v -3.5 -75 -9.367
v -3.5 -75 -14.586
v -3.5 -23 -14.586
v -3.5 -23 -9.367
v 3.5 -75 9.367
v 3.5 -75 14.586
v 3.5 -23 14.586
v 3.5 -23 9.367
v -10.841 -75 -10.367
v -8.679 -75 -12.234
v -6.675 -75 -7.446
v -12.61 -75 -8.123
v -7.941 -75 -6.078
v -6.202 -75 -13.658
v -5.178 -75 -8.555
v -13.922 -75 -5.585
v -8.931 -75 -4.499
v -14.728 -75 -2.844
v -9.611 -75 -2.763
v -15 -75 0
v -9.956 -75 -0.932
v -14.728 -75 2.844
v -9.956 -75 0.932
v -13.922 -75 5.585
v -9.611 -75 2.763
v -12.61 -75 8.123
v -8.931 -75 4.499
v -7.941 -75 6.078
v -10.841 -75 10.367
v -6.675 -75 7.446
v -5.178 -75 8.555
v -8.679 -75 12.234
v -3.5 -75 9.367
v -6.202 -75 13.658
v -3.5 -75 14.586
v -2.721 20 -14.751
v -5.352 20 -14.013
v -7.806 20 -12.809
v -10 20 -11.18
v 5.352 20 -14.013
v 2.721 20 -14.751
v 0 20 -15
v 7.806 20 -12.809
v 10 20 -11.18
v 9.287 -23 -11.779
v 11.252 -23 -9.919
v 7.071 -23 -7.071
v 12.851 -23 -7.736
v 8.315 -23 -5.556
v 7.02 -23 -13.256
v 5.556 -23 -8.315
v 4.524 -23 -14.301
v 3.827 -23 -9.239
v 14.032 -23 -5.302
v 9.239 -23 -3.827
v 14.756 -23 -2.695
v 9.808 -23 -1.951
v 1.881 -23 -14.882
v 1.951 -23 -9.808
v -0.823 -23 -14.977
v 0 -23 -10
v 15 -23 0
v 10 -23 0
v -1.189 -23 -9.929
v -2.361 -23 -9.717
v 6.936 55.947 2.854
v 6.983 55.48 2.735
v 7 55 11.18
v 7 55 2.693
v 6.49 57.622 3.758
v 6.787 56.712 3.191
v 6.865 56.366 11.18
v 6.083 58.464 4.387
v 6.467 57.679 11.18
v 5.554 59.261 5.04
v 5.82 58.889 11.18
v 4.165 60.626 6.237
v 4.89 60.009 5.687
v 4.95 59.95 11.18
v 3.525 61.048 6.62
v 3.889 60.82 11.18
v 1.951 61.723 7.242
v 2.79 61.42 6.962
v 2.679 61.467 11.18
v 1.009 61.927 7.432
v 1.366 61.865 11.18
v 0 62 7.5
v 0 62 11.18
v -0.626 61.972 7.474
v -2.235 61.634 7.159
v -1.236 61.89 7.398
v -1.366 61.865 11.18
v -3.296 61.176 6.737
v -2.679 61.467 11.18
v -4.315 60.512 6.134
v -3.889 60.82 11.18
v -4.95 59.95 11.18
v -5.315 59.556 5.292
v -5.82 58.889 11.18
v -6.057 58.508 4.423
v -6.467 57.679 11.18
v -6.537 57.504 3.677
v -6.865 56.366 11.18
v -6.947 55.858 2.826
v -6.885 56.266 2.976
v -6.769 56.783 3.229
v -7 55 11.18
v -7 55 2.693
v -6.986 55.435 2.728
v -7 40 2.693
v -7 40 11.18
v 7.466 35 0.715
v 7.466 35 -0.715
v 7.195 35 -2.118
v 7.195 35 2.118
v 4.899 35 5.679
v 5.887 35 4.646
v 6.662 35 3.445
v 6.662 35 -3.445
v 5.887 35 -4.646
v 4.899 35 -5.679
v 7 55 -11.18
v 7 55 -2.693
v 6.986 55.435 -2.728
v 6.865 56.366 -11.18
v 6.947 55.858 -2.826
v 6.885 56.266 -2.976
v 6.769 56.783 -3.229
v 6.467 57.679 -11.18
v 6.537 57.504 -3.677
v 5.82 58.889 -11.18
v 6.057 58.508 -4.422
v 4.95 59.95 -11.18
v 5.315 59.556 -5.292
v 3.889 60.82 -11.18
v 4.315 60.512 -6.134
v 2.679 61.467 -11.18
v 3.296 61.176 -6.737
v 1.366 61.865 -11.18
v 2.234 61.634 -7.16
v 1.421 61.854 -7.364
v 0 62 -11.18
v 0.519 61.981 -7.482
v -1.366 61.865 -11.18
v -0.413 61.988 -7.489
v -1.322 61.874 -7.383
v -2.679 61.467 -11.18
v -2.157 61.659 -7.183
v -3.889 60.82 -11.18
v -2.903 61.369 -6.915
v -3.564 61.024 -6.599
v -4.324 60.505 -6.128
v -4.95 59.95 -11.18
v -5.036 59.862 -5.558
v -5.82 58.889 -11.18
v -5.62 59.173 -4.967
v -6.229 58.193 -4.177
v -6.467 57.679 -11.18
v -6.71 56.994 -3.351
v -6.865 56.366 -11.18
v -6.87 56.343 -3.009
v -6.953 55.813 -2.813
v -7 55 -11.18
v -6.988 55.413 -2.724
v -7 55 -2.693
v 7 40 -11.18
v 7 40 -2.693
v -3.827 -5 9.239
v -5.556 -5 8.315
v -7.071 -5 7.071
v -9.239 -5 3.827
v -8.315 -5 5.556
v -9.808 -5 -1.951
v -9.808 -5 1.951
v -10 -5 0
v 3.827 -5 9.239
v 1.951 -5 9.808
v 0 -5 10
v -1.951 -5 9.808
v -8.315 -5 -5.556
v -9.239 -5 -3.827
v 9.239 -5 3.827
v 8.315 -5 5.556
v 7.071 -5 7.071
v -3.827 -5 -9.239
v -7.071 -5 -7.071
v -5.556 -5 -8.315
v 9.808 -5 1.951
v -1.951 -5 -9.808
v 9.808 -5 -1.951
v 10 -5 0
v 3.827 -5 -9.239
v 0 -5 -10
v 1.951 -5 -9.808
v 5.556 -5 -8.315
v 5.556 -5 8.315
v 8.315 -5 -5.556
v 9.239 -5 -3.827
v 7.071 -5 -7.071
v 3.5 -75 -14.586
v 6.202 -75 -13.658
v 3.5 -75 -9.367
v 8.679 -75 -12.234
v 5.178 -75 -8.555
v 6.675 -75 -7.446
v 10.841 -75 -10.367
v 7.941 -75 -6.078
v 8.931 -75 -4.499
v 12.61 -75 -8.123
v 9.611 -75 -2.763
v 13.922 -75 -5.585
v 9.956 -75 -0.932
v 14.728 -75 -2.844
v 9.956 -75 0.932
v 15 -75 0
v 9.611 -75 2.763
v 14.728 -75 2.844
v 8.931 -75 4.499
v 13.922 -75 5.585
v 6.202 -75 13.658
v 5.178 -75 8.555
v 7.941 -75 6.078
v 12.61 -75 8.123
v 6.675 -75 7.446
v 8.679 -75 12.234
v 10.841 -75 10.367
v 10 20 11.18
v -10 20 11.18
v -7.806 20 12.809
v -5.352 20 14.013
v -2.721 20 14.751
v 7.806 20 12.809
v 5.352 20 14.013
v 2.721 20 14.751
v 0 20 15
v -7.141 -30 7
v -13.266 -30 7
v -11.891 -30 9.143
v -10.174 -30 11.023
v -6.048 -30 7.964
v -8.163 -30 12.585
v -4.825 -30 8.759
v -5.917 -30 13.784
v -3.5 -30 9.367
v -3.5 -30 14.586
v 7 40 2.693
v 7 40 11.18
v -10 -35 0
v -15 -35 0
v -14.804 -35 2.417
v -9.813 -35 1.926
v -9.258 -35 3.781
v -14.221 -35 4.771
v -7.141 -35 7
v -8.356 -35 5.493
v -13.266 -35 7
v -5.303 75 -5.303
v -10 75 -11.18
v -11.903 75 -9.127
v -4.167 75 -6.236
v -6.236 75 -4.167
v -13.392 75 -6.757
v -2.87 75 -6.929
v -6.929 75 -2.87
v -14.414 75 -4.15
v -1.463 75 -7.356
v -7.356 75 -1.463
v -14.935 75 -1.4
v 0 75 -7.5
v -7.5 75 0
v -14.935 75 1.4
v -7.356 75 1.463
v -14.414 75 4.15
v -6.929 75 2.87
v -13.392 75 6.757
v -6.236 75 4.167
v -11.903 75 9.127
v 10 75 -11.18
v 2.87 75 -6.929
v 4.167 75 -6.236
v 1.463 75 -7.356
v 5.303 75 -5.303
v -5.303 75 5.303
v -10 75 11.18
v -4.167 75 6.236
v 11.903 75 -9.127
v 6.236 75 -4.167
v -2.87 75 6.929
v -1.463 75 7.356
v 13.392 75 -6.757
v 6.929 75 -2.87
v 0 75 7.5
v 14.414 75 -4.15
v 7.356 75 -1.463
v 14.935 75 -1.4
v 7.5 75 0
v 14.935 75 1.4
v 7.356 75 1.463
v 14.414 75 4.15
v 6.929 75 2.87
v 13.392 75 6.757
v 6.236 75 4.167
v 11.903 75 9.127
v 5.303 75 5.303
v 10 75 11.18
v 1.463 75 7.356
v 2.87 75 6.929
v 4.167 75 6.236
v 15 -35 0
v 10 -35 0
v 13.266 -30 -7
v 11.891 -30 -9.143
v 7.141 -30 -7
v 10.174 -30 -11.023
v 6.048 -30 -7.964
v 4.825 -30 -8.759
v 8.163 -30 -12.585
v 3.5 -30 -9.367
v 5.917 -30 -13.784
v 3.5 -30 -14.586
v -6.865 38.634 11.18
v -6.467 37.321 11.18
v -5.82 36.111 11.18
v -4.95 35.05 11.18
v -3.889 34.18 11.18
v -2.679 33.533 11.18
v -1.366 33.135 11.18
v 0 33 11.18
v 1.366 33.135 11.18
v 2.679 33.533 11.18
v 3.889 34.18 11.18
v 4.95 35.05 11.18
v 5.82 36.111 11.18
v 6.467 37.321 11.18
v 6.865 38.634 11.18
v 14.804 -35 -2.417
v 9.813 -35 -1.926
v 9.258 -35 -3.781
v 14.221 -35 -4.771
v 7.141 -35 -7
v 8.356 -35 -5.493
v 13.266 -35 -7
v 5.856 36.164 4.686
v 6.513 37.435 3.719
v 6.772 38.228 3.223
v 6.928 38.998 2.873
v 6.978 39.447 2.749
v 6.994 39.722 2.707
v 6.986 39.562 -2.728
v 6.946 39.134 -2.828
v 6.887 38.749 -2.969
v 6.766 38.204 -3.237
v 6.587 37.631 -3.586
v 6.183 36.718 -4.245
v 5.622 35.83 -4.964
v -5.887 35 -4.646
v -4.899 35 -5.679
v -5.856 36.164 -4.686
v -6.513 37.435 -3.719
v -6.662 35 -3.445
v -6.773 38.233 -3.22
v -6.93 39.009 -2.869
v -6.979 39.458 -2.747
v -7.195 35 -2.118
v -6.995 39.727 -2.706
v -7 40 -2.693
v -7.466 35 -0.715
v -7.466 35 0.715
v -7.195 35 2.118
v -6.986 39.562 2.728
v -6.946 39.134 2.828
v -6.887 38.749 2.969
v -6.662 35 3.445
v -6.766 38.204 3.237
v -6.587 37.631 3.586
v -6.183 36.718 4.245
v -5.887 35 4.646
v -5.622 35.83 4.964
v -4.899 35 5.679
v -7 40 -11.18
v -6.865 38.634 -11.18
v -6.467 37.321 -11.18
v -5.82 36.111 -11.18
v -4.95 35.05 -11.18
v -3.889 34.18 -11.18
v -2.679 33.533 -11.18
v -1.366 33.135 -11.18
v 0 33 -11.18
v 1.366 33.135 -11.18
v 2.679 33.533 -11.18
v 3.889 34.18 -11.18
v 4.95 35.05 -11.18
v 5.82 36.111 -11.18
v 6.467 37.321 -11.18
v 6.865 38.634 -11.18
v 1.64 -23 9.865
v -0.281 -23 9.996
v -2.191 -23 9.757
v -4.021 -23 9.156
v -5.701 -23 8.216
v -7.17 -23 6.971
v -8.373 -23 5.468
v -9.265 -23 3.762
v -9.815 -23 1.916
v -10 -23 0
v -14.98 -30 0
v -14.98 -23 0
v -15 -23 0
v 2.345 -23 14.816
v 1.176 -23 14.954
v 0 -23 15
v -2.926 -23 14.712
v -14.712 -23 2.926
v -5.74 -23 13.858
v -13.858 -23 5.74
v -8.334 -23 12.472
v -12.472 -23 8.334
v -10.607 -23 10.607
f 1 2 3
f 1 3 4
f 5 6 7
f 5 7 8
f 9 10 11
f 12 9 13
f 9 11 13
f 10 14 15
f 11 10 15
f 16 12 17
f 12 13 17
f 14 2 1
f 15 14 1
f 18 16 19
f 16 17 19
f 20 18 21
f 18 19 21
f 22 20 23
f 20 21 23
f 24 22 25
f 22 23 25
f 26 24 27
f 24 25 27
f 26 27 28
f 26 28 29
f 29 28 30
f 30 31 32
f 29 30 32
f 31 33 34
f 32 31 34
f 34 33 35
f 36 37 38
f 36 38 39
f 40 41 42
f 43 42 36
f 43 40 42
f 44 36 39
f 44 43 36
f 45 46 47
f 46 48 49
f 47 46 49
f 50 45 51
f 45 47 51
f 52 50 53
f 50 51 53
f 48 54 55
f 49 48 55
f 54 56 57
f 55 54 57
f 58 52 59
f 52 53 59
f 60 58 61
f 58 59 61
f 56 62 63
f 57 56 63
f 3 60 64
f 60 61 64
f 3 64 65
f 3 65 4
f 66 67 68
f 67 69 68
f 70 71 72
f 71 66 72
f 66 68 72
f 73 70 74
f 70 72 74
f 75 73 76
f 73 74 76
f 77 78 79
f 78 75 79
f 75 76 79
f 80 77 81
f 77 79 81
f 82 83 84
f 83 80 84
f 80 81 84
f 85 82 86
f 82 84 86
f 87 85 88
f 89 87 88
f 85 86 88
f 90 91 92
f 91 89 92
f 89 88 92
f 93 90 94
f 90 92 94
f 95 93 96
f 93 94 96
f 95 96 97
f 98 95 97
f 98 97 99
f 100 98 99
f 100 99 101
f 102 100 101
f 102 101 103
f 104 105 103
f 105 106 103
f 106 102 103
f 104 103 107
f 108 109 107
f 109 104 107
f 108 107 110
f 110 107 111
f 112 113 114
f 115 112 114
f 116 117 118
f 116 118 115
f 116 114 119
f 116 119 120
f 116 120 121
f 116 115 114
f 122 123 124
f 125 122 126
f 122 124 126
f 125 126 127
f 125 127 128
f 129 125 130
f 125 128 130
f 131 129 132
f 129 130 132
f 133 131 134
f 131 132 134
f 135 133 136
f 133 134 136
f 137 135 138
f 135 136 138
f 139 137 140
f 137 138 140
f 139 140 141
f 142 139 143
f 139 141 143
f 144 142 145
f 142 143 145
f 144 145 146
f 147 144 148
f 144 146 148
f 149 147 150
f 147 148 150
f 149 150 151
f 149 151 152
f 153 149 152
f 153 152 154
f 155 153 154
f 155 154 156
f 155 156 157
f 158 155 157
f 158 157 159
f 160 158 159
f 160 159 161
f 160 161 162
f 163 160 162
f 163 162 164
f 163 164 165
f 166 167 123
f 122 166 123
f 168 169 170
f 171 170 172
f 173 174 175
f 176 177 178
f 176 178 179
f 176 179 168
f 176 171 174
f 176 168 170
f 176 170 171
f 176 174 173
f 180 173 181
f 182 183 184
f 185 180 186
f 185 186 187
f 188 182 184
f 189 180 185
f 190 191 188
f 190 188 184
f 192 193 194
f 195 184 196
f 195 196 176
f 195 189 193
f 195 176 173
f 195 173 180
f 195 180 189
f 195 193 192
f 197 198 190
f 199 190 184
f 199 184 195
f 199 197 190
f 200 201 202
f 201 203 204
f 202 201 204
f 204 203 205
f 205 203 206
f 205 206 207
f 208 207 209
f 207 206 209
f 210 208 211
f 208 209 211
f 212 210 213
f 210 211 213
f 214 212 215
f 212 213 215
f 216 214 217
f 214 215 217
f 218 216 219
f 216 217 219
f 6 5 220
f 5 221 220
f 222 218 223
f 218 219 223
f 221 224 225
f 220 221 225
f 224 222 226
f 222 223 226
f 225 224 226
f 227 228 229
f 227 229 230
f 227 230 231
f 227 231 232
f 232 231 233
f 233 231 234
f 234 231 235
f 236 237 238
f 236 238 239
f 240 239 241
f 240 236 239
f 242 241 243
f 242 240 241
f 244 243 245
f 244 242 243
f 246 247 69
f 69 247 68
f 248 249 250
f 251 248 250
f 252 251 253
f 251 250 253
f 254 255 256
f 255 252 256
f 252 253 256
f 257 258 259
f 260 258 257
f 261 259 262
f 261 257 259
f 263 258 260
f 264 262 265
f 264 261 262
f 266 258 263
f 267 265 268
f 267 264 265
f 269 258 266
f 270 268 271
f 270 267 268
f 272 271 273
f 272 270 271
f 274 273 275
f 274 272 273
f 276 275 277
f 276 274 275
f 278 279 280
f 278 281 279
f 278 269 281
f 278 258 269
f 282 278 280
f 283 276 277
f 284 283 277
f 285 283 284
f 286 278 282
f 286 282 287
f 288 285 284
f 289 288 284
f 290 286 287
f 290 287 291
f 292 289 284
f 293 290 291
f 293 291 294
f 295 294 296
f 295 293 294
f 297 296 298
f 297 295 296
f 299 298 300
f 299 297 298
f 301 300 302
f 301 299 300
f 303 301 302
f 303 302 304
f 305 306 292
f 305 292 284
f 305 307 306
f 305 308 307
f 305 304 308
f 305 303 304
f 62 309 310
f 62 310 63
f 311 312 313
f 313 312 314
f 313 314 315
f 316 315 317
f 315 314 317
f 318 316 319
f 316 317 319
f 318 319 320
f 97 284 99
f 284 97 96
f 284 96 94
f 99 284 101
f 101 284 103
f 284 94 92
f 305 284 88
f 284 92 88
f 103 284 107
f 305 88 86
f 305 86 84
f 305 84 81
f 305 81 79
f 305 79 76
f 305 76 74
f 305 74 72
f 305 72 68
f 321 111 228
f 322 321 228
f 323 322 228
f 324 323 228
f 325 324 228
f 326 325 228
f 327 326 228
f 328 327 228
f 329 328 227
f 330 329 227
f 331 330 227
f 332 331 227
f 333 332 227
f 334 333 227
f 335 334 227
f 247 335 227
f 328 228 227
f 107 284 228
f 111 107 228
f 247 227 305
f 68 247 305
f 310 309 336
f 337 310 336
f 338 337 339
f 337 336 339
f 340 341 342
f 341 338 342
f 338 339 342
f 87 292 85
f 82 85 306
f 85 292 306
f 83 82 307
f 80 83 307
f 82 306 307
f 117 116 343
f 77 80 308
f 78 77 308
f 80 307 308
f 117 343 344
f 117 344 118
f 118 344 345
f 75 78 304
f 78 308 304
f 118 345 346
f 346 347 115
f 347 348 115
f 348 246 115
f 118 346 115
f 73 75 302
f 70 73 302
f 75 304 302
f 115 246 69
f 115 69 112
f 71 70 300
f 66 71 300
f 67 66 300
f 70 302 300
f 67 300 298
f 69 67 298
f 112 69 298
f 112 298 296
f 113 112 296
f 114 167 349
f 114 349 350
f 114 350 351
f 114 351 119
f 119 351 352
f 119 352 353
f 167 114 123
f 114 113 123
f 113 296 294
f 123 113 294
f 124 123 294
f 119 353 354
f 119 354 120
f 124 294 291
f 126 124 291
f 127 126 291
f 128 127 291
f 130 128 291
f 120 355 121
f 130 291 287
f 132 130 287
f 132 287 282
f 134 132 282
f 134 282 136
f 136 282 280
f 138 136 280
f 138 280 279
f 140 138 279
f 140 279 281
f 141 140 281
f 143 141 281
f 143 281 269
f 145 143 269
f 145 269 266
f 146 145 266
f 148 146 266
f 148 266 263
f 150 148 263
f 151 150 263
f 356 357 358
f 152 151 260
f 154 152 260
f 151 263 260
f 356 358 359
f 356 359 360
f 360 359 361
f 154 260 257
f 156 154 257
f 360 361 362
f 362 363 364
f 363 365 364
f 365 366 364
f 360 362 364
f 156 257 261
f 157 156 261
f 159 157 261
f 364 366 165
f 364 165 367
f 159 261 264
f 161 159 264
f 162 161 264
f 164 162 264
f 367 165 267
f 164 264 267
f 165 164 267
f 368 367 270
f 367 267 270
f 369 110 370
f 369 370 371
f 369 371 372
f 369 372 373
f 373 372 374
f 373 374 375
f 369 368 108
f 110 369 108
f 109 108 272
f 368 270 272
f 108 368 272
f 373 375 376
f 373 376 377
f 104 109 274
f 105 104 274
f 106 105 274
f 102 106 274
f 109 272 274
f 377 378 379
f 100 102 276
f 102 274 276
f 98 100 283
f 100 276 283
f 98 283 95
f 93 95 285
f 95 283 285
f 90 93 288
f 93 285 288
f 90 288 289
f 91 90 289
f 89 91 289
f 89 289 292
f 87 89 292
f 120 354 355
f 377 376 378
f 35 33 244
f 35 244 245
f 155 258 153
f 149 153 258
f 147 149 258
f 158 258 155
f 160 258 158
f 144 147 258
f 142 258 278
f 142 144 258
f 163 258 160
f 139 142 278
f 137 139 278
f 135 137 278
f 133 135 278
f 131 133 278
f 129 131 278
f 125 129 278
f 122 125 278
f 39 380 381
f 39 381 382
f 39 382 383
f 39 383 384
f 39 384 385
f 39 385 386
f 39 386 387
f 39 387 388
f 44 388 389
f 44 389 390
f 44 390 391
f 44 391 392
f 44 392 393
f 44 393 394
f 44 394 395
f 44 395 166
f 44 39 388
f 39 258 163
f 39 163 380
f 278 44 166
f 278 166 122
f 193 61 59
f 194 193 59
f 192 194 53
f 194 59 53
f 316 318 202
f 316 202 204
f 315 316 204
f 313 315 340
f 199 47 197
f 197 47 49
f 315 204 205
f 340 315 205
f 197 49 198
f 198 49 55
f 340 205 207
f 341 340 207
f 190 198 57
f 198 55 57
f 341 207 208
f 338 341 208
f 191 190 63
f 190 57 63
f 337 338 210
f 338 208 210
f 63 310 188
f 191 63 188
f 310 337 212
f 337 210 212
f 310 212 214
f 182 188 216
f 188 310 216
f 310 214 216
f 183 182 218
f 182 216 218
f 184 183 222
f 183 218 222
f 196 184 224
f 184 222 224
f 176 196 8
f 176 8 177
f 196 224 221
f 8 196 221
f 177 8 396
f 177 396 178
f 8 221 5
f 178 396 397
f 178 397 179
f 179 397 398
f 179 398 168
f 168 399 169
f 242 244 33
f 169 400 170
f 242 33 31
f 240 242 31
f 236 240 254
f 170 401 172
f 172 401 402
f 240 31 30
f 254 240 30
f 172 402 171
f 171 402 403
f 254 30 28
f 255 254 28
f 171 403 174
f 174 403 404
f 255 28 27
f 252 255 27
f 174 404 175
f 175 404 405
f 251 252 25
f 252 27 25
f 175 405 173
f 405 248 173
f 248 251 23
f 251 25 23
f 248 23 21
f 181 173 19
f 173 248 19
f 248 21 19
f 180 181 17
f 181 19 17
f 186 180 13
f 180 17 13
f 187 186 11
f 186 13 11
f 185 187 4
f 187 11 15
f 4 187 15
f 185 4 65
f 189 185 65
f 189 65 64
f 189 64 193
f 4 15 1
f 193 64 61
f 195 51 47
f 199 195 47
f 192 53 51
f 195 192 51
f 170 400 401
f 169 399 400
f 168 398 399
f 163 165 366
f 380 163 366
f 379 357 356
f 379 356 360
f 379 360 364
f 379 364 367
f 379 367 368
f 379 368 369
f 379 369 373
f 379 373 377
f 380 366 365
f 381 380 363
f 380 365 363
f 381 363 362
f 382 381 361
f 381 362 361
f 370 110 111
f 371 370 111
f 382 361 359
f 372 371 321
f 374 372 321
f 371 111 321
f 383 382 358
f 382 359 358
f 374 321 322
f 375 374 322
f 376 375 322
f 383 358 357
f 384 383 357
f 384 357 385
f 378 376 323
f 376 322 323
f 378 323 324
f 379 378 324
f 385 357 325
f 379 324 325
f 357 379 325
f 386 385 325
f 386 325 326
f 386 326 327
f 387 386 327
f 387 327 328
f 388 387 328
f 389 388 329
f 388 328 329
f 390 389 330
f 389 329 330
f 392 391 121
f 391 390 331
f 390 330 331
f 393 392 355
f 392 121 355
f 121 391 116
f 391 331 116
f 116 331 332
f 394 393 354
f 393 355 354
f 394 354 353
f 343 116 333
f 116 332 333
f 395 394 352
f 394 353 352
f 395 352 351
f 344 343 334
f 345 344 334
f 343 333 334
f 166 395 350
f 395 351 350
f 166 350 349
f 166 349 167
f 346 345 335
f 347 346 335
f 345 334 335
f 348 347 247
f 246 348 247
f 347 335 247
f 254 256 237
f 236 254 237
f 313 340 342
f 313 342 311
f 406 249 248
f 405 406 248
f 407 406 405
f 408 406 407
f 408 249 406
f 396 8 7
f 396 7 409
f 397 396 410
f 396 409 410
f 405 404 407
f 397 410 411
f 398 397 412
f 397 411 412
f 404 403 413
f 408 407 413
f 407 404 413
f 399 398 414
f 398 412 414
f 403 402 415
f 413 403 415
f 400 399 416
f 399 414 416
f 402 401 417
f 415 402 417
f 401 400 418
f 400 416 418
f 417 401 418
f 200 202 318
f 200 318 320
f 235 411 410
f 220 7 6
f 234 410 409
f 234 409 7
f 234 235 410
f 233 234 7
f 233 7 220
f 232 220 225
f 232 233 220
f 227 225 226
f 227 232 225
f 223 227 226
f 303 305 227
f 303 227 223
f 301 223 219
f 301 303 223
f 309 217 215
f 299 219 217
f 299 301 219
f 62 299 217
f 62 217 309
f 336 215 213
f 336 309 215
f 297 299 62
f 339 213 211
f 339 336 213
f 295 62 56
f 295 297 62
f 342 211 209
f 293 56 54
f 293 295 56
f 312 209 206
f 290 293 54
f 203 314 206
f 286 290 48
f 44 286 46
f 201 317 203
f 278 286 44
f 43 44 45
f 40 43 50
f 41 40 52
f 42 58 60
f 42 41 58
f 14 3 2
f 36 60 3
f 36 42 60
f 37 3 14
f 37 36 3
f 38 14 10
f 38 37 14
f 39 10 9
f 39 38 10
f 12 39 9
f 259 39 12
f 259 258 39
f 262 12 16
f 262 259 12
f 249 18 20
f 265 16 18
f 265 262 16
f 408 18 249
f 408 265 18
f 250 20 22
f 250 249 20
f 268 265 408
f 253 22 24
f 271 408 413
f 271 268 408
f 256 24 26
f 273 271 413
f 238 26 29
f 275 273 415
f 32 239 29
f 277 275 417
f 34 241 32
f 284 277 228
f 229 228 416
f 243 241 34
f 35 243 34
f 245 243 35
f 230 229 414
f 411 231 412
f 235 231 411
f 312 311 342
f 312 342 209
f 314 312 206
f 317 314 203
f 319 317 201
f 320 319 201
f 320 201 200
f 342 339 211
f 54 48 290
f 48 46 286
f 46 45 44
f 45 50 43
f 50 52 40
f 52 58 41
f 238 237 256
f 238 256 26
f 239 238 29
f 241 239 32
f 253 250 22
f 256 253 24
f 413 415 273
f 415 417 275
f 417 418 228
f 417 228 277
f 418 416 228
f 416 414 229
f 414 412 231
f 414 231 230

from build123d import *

# Parameters (mm, degrees)
SKETCH1_R                = 15
BOSS_EXTRUDE1_DEPTH      = 75
CUT_EXTRUDE1_DEPTH       = 52
CUT_EXTRUDE2_DEPTH       = 3.5
SKETCH9_R                = 10
CUT_EXTRUDE12_DEPTH      = 70
SKETCH17_W               = 7
SKETCH17_H               = 12
CUT_EXTRUDE19_DEPTH      = 15
SKETCH19_W               = 7
SKETCH19_H               = 12
CUT_EXTRUDE20_DEPTH      = 15
SKETCH20_R               = 7.5
CUT_EXTRUDE21_DEPTH      = 40
CUT_EXTRUDE25_DEPTH      = 152.492574075
CUT_EXTRUDE25_DEPTH_BACK = 55
SKETCH21_W               = 20
SKETCH21_H               = 7.639320226
CUT_EXTRUDE27_DEPTH      = 81.841883926
CUT_EXTRUDE27_DEPTH_BACK = 81.841883926


with BuildPart() as part:
    # Sketch1 → Boss-Extrude1 (new, symmetric)
    with BuildSketch(Plane(origin=(0, 0, 0), x_dir=(1, 0, 0), z_dir=(0, 1, 0))):
        with Locations(Location((0, 0, 0), (0, 0, 270))):
            Circle(SKETCH1_R)
    extrude(amount=BOSS_EXTRUDE1_DEPTH, both=True)

    # Sketch2 → Cut-Extrude1 (cut)
    with BuildSketch(Plane.XZ.offset(75)):
        with BuildLine():
            Line((3.5, 15), (3.5, -15))
            ThreePointArc((3.5, -15), (0, -18.5), (-3.5, -15))
            Line((-3.5, -15), (-3.5, 15))
            ThreePointArc((-3.5, 15), (0, 18.5), (3.5, 15))
        make_face()
    extrude(amount=-CUT_EXTRUDE1_DEPTH, mode=Mode.SUBTRACT)

    # Sketch3 → Cut-Extrude2 (cut, symmetric)
    with BuildSketch(Plane(origin=(0, -26.5, 0), x_dir=(1, 0, 0), z_dir=(0, 1, 0))):
        Polygon((-14.980069936, 0), (-15.328117643, -9.993941304), (-0.348047707, -16.993941304), (0, -7), align=None)
        Polygon((15, 0), (0, 7), (0.348047707, 16.993941304), (15.348047707, 9.993941304), align=None)
    extrude(amount=CUT_EXTRUDE2_DEPTH, both=True, mode=Mode.SUBTRACT)

    # Sketch9 → Cut-Extrude12 (cut)
    with BuildSketch(Plane.XZ.offset(75)):
        with Locations(Location((0, 0, 0), (0, 0, 270))):
            Circle(SKETCH9_R)
    extrude(amount=-CUT_EXTRUDE12_DEPTH, mode=Mode.SUBTRACT)

    # Sketch17 → Cut-Extrude19 (cut)
    with BuildSketch(Plane(origin=(15, 0, 0), x_dir=(0, 0, -1), z_dir=(1, 0, 0))):
        with Locations((3.5, -29)):
            Rectangle(SKETCH17_W, SKETCH17_H)
    extrude(amount=-CUT_EXTRUDE19_DEPTH, mode=Mode.SUBTRACT)

    # Sketch19 → Cut-Extrude20 (cut)
    with BuildSketch(Plane.ZY.offset(15)):
        with Locations((3.5, -29)):
            Rectangle(SKETCH19_W, SKETCH19_H)
    extrude(amount=-CUT_EXTRUDE20_DEPTH, mode=Mode.SUBTRACT)

    # Sketch20 → Cut-Extrude21 (cut)
    with BuildSketch(Plane(origin=(0, 75, 0), x_dir=(1, 0, 0), z_dir=(0, 1, 0))):
        with Locations(Location((0, 0, 0), (0, 0, 270))):
            Circle(SKETCH20_R)
    extrude(amount=-CUT_EXTRUDE21_DEPTH, mode=Mode.SUBTRACT)

    # Sketch21 → Cut-Extrude25 (cut, two sides: drawn at the far end of the back side and taken through both)
    with BuildSketch(Plane(origin=(0, 75, 0), x_dir=(1, 0, 0), z_dir=(0, 1, 0)).offset(-CUT_EXTRUDE25_DEPTH_BACK)):
        with Locations((0, 15)):
            Rectangle(SKETCH21_W, SKETCH21_H)
        with Locations((0, -15)):
            Rectangle(SKETCH21_W, SKETCH21_H)
    extrude(amount=CUT_EXTRUDE25_DEPTH + CUT_EXTRUDE25_DEPTH_BACK, mode=Mode.SUBTRACT)

    # Sketch23 → Cut-Extrude27 (cut, two sides: drawn at the far end of the back side and taken through both)
    with BuildSketch(Plane(origin=(0, 0, -11.180339887), x_dir=(-1, 0, 0), z_dir=(0, 0, -1)).offset(-CUT_EXTRUDE27_DEPTH_BACK)):
        with BuildLine():
            Line((7, 55), (7, 40))
            ThreePointArc((7, 40), (0, 33), (-7, 40))
            Line((-7, 40), (-7, 55))
            ThreePointArc((-7, 55), (0, 62), (7, 55))
        make_face()
    extrude(amount=CUT_EXTRUDE27_DEPTH + CUT_EXTRUDE27_DEPTH_BACK, mode=Mode.SUBTRACT)


solid = part.part
